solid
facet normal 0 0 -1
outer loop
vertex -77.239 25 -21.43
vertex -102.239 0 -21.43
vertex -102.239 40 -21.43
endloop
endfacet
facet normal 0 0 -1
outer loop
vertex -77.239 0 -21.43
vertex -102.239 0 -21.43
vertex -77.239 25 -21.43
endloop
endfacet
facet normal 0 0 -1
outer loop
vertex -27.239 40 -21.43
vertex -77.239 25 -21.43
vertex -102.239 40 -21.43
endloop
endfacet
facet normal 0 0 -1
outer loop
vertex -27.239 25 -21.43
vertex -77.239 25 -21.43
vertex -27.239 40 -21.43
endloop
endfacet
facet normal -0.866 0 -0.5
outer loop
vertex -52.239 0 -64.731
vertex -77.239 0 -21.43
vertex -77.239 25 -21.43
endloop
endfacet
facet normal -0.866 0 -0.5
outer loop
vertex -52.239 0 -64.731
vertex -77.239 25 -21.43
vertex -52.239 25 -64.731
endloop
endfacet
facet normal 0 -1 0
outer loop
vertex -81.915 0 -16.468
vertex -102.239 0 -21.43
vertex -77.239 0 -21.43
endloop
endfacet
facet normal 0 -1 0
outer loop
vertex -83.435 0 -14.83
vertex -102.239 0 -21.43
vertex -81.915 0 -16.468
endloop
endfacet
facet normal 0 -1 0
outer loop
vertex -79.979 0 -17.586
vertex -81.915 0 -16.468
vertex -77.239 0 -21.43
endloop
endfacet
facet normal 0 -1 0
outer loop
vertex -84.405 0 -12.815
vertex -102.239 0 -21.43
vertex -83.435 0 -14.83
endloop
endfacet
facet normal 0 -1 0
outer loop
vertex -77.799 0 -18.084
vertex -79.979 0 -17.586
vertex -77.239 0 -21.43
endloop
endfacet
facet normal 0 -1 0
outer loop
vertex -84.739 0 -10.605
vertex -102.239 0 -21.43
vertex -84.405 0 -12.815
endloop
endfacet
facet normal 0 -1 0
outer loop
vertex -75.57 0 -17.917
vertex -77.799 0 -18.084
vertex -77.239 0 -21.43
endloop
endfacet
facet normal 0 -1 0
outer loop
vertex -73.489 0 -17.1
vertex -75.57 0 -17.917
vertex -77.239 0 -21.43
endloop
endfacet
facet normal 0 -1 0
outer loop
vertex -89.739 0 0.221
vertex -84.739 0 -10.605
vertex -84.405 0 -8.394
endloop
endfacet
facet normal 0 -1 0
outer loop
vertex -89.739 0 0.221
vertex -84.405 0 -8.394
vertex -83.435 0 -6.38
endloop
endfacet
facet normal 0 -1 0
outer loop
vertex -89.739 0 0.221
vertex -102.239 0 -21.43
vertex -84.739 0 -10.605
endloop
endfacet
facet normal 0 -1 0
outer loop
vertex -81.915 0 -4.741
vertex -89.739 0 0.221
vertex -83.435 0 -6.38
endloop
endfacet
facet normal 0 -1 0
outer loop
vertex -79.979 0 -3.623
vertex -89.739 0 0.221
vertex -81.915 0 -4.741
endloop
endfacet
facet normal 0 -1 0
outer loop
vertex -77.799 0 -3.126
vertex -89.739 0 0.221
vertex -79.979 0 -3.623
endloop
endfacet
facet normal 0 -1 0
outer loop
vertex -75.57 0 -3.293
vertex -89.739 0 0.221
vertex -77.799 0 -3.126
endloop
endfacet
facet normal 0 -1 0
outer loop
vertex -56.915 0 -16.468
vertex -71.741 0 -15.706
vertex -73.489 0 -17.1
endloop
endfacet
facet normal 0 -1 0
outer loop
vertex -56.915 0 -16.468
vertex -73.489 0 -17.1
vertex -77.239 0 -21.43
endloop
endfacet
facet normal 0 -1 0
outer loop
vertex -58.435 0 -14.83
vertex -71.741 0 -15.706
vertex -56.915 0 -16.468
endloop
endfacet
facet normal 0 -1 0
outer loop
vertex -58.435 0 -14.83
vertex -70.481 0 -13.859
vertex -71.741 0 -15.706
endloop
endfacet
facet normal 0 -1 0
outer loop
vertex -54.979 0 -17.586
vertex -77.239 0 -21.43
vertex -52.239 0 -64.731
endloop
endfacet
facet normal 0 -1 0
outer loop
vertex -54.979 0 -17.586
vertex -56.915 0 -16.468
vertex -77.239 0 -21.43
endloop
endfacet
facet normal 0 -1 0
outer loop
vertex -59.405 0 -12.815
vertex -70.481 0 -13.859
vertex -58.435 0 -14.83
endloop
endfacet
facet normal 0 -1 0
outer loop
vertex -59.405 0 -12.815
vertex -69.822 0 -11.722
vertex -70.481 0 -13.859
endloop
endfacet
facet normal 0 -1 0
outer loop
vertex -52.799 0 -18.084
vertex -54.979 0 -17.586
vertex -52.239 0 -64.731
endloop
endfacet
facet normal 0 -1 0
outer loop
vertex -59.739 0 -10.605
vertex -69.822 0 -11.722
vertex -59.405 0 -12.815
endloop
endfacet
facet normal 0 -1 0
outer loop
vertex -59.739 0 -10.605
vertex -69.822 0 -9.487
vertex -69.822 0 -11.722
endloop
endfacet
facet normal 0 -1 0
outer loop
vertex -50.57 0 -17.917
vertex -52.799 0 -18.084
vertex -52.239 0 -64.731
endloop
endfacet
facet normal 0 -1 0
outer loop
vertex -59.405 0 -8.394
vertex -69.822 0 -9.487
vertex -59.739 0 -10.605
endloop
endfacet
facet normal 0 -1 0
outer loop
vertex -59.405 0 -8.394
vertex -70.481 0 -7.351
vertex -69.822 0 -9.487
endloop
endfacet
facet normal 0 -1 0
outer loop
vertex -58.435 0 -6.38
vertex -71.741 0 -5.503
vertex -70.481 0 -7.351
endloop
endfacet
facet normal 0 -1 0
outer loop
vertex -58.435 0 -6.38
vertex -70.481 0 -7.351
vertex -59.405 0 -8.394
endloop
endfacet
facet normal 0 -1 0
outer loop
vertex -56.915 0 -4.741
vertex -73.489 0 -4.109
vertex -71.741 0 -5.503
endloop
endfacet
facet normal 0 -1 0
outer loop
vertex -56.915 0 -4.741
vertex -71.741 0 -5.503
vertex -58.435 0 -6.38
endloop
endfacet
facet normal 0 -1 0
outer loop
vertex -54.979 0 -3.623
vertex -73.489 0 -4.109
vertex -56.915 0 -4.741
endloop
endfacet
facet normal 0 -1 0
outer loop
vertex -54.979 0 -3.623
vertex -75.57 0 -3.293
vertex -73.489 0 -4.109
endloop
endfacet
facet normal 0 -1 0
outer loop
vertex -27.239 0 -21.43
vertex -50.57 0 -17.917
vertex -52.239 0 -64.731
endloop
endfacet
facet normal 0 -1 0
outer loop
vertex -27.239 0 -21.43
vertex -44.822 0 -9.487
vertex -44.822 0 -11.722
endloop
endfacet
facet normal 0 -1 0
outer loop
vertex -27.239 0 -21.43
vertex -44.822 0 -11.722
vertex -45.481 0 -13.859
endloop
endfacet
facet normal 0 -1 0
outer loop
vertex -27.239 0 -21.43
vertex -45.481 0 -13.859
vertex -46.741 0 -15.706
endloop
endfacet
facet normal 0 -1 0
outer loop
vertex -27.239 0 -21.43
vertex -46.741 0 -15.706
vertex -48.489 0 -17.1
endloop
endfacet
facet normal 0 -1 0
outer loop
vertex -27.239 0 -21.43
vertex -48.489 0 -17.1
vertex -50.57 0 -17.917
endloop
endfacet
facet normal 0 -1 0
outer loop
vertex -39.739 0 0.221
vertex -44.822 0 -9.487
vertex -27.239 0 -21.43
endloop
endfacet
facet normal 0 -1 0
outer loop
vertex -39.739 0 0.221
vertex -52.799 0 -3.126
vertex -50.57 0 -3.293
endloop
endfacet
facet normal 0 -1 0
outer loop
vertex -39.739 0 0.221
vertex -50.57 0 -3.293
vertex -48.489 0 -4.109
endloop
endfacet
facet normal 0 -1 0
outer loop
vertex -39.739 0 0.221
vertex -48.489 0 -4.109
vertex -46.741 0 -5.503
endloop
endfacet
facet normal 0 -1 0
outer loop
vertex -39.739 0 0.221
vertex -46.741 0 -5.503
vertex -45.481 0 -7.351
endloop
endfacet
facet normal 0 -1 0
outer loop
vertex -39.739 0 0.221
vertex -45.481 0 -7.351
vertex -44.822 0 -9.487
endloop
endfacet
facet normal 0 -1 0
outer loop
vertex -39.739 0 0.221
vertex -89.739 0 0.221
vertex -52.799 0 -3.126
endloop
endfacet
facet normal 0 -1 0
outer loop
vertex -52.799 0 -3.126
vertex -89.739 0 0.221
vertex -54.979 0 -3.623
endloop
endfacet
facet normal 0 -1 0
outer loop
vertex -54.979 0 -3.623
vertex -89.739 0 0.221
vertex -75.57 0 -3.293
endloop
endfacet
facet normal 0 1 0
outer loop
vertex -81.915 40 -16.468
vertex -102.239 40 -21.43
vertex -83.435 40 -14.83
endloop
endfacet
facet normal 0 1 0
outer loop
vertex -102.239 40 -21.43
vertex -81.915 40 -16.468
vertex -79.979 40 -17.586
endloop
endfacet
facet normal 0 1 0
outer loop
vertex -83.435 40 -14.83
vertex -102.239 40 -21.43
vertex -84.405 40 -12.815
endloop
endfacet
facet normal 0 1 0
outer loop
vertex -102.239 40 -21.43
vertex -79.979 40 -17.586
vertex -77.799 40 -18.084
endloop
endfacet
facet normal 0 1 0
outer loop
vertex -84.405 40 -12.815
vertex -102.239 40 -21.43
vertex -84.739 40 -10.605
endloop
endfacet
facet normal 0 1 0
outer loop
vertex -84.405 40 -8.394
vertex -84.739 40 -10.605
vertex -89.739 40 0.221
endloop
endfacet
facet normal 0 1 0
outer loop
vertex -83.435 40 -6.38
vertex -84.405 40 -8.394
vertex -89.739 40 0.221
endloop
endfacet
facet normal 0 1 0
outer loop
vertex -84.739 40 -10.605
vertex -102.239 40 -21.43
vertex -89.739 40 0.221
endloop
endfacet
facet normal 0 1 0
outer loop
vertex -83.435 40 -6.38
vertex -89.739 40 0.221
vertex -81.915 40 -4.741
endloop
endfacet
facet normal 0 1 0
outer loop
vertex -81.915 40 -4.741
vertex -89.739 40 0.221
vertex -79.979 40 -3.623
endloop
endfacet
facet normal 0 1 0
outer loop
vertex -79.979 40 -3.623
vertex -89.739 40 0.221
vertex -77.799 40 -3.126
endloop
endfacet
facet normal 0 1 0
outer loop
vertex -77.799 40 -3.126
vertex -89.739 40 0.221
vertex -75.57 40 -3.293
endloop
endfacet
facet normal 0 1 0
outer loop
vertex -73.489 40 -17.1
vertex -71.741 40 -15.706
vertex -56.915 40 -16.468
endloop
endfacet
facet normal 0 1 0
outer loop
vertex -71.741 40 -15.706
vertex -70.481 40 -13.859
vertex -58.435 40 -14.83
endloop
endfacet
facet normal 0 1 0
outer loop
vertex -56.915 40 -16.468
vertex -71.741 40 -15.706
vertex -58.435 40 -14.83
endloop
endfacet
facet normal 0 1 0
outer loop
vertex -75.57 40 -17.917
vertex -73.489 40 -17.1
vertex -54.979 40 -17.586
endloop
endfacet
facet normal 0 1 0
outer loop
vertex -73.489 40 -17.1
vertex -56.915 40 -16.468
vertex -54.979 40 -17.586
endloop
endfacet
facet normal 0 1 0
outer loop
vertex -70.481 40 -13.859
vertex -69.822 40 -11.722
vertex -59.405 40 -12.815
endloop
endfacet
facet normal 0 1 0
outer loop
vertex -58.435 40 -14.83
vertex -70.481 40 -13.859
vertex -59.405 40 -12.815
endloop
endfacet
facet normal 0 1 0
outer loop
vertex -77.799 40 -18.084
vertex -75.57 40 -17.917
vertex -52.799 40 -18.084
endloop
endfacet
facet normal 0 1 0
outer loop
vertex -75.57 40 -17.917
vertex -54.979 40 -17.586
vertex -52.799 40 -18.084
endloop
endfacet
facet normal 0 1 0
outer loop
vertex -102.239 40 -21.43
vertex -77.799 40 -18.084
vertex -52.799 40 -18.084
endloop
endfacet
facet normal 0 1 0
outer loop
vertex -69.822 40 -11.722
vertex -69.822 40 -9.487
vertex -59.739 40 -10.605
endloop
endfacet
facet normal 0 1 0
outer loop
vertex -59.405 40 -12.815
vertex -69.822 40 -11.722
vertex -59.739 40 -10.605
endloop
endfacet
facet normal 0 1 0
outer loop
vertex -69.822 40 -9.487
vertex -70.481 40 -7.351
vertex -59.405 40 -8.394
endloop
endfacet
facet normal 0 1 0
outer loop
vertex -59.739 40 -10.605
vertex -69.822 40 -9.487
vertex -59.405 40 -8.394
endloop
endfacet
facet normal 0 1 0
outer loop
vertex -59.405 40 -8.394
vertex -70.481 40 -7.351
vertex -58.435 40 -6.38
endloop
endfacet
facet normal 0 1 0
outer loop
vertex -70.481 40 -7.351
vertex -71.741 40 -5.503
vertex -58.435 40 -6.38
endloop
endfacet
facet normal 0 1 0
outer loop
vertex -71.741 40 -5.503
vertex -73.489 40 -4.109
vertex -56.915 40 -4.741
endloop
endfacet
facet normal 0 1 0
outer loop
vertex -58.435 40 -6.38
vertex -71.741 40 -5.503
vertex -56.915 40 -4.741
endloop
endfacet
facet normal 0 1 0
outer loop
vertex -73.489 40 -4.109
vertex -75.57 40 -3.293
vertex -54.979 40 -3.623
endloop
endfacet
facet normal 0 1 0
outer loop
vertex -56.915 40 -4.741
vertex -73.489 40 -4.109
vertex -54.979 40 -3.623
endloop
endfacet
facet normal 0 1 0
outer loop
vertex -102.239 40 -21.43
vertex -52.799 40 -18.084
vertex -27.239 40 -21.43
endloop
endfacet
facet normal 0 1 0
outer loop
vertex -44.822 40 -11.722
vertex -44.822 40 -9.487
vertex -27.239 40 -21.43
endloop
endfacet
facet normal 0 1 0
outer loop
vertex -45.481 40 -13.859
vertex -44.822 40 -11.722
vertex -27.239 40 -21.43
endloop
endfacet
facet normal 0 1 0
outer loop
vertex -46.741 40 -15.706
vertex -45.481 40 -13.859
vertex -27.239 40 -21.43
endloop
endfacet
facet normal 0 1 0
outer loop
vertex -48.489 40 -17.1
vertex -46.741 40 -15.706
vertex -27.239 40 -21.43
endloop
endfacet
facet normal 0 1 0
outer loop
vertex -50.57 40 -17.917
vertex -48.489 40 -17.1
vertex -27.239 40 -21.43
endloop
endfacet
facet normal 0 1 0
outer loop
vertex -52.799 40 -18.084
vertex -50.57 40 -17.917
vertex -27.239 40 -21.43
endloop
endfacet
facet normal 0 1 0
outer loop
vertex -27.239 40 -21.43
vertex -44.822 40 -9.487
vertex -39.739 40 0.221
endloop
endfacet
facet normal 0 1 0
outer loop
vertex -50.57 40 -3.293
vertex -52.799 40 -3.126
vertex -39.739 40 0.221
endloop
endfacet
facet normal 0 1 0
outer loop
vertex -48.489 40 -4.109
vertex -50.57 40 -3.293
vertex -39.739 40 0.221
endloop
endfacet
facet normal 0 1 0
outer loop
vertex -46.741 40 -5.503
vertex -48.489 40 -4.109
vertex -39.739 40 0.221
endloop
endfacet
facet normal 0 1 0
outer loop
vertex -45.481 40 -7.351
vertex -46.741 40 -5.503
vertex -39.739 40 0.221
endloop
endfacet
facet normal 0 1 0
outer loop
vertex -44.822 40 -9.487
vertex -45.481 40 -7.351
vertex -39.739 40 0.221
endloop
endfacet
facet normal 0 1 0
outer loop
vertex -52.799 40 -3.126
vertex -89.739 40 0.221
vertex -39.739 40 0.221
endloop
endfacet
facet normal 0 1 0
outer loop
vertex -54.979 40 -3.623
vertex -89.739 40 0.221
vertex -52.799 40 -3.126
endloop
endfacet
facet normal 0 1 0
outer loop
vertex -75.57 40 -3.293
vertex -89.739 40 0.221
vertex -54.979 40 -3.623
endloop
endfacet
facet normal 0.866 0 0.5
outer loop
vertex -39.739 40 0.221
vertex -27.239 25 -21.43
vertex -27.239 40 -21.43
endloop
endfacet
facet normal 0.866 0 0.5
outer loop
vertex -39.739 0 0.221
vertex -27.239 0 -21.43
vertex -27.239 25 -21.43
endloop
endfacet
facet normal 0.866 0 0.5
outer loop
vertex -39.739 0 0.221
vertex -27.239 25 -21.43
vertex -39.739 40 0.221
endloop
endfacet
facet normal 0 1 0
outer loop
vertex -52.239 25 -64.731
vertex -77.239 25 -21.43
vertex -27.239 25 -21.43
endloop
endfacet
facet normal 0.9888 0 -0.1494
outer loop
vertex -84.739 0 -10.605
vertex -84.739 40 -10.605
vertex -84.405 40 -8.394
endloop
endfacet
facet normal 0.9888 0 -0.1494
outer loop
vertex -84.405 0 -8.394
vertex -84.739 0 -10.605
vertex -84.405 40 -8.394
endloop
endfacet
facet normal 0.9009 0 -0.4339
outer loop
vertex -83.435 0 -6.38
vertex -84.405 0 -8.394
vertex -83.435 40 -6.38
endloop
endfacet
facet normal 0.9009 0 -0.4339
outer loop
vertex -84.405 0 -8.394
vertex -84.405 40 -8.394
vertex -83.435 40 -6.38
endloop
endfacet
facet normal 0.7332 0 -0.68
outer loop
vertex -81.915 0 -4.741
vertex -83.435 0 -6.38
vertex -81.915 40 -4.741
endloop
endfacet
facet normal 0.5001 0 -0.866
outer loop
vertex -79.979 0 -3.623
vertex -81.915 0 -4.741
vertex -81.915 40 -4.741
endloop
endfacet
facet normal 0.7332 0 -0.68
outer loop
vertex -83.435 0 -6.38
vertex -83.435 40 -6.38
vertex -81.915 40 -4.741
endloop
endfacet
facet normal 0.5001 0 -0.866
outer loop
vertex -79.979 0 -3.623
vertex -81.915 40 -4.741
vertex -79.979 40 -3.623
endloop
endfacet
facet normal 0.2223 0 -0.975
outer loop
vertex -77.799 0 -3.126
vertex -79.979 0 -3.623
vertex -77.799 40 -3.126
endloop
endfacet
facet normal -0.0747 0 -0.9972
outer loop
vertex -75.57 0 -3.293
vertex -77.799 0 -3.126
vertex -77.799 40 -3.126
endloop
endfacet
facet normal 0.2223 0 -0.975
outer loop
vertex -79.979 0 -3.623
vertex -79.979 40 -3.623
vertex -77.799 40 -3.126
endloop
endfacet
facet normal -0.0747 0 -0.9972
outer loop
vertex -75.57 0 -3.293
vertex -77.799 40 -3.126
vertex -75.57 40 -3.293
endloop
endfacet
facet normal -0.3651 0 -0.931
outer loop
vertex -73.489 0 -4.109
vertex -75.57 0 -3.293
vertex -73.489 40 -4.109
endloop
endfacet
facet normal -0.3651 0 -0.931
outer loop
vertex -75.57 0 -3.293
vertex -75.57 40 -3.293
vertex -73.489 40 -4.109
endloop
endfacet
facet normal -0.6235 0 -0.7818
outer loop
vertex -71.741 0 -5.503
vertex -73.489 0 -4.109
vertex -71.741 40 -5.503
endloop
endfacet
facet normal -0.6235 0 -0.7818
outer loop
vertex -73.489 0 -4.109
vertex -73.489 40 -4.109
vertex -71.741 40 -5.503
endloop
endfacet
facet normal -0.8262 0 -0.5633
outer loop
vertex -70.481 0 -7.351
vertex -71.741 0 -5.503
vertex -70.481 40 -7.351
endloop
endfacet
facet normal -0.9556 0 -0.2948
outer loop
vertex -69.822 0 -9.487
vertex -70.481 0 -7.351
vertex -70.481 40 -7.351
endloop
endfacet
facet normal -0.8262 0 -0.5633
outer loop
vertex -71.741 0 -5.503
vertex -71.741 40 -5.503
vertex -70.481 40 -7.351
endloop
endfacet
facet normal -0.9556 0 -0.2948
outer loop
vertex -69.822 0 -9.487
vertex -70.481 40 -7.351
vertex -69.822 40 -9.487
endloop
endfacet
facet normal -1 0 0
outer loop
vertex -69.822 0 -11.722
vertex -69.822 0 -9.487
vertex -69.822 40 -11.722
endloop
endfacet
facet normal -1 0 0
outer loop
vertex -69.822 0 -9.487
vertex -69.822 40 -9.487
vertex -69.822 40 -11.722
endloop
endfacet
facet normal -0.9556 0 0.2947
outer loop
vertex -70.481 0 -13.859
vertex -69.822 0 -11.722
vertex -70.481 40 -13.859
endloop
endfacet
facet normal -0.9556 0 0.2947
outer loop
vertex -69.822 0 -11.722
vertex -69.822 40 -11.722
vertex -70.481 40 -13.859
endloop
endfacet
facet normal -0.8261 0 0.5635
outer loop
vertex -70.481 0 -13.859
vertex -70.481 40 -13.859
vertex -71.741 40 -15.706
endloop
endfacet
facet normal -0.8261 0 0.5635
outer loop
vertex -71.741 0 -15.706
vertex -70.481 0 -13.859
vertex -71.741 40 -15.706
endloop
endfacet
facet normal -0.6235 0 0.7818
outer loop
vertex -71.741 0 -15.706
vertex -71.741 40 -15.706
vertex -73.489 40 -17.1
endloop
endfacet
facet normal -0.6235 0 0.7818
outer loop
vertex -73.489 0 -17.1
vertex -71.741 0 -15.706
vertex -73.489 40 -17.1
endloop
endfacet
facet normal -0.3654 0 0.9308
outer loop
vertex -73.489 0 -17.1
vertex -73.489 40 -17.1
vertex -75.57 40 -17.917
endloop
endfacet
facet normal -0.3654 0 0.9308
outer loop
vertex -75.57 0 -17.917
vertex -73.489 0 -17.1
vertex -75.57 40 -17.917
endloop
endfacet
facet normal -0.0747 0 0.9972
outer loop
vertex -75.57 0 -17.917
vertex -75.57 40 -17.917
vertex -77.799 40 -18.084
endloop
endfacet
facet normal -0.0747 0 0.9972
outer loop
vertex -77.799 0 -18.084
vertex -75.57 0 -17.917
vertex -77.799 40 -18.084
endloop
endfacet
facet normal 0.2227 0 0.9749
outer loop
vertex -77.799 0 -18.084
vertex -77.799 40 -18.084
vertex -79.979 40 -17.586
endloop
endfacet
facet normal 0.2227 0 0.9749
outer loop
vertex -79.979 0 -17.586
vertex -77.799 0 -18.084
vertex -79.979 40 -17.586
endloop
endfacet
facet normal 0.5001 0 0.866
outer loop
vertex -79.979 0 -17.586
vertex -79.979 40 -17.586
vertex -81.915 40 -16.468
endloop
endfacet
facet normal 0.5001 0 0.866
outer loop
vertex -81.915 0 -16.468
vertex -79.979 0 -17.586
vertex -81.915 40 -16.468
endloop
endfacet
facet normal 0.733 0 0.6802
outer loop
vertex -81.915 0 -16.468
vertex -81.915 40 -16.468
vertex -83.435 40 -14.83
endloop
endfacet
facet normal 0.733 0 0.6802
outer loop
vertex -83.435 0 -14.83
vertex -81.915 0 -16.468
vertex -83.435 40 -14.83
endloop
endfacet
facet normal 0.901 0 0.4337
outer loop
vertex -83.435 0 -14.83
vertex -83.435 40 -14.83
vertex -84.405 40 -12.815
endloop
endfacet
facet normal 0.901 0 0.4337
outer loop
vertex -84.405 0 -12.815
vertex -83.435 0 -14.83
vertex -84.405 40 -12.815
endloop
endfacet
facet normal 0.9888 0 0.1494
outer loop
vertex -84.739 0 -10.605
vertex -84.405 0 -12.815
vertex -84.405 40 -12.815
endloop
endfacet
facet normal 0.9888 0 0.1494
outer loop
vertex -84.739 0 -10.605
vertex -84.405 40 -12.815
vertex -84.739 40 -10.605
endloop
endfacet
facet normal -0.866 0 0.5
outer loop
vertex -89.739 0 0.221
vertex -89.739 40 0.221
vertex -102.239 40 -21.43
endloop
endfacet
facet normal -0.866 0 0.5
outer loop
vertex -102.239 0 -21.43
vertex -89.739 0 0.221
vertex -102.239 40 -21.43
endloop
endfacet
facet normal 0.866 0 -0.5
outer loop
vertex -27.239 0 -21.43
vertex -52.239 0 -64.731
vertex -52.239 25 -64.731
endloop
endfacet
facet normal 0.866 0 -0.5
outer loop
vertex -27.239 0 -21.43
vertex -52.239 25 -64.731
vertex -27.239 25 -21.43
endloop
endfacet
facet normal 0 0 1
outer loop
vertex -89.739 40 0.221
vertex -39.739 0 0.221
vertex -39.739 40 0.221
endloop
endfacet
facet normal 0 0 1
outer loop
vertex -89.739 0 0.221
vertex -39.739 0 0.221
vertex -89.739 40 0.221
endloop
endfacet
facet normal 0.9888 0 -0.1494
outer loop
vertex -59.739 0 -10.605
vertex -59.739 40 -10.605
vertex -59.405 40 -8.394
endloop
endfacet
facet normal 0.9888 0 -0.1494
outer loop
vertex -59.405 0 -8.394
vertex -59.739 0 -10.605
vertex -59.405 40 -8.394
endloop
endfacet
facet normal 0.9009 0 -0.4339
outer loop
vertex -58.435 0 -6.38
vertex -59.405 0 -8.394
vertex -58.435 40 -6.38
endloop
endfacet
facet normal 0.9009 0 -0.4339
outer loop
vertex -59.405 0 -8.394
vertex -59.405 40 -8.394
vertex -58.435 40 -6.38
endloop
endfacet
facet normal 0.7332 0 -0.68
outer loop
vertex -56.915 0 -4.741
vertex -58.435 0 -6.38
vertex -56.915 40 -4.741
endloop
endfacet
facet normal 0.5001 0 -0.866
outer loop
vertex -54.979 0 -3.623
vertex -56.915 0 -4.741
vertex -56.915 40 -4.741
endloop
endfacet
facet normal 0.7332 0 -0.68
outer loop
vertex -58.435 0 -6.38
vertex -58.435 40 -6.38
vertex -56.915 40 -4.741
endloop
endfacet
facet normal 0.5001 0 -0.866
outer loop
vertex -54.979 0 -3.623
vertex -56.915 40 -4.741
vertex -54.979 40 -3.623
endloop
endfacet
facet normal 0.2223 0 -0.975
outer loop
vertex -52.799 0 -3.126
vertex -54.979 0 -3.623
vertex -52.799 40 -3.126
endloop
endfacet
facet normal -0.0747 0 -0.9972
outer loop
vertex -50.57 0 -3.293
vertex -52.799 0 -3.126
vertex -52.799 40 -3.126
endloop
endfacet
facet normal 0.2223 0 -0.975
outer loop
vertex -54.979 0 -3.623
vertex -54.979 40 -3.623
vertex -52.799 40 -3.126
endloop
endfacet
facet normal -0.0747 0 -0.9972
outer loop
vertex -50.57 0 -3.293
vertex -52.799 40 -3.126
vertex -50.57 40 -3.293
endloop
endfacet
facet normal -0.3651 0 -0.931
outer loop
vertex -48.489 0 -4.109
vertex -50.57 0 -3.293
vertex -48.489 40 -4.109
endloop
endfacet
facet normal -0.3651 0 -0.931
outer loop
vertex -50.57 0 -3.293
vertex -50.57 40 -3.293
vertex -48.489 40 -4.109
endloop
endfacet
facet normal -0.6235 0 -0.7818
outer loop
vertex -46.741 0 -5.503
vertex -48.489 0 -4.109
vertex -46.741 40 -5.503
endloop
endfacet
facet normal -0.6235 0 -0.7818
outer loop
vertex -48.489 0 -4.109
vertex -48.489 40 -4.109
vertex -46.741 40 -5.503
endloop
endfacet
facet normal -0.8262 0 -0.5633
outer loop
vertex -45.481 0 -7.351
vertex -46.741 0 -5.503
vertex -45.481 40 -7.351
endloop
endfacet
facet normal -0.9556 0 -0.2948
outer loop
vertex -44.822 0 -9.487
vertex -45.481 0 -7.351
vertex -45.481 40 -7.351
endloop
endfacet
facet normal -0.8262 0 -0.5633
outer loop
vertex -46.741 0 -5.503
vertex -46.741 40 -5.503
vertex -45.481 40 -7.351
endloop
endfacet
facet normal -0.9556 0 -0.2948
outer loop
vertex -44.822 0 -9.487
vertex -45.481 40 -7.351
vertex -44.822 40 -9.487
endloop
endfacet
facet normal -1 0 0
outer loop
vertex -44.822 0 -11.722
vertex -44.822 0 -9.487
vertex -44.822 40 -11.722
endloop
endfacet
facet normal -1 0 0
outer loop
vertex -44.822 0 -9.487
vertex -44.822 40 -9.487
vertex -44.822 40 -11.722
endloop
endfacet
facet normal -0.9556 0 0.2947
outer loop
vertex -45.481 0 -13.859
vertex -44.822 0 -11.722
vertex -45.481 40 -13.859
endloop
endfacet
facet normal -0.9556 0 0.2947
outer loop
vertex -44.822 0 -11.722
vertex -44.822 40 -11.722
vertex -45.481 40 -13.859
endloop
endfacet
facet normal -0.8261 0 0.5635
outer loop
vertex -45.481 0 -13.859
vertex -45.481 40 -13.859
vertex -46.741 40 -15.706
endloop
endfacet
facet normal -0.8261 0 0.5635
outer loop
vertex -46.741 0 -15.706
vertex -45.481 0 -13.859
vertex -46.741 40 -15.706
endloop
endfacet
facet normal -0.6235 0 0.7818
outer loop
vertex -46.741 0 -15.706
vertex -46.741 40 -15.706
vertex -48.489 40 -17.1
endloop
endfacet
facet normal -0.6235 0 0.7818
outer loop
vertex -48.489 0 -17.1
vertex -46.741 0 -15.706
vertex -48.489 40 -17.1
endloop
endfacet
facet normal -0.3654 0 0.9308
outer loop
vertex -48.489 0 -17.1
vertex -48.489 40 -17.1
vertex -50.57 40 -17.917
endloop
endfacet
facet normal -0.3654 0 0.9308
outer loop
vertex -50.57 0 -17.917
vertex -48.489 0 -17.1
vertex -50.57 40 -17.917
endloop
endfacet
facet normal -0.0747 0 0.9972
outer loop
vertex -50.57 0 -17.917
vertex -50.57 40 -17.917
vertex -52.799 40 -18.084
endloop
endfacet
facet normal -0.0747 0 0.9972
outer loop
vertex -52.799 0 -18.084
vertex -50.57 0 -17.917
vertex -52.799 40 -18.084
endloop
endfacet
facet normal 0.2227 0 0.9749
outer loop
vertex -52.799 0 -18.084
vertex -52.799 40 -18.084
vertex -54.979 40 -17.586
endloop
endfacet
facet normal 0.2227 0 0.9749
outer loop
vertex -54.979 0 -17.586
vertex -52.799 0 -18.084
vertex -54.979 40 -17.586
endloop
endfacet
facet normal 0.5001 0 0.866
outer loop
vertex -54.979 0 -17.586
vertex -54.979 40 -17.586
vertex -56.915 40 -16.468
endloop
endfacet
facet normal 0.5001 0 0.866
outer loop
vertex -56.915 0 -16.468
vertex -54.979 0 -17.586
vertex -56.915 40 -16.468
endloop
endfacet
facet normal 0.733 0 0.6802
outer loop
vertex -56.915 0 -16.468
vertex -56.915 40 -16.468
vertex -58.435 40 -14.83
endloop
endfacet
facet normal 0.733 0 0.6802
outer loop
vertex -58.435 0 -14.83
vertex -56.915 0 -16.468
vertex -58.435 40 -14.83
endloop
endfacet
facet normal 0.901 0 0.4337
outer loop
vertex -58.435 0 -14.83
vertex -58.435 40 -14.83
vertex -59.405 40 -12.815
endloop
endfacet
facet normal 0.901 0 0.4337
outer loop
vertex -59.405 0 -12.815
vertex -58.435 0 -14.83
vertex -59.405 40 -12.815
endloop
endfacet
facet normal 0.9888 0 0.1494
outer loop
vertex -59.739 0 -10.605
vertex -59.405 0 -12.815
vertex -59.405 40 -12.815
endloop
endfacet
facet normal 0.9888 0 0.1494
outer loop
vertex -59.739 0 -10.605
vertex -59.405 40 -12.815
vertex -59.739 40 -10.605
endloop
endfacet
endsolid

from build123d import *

# Parameters (mm, degrees)
F1_DEPTH = 25
F2_DEPTH = 40
F3_D     = 15
F4_D     = 15


with BuildPart() as f1:
    # F0 (on Front) → F1 (new body)
    with BuildSketch(Plane.XZ):
        Polygon((-77.238509, -21.429978), (-52.238509, -64.731248), (-27.238509, -21.429978), (-52.238509, -21.429978), align=None)
    extrude(amount=-F1_DEPTH)

    # F0 (on Front) → F2 (join)
    with BuildSketch(Plane.XZ):
        Polygon((-102.238509, -21.429978), (-77.238509, -21.429978), (-52.238509, -21.429978), (-27.238509, -21.429978), (-39.738509, 0.220657), (-52.238509, 0.220657), (-89.738509, 0.220657), align=None)
    extrude(amount=-F2_DEPTH)

    # F3 (through all)
    with Locations(Plane.XZ):
        with Locations((-52.238509, -10.60466)):
            Hole(F3_D / 2)

    # F4 (through all)
    with Locations(Plane.XZ):
        with Locations((-77.238509, -10.60466)):
            Hole(F4_D / 2)


solid = f1.part
